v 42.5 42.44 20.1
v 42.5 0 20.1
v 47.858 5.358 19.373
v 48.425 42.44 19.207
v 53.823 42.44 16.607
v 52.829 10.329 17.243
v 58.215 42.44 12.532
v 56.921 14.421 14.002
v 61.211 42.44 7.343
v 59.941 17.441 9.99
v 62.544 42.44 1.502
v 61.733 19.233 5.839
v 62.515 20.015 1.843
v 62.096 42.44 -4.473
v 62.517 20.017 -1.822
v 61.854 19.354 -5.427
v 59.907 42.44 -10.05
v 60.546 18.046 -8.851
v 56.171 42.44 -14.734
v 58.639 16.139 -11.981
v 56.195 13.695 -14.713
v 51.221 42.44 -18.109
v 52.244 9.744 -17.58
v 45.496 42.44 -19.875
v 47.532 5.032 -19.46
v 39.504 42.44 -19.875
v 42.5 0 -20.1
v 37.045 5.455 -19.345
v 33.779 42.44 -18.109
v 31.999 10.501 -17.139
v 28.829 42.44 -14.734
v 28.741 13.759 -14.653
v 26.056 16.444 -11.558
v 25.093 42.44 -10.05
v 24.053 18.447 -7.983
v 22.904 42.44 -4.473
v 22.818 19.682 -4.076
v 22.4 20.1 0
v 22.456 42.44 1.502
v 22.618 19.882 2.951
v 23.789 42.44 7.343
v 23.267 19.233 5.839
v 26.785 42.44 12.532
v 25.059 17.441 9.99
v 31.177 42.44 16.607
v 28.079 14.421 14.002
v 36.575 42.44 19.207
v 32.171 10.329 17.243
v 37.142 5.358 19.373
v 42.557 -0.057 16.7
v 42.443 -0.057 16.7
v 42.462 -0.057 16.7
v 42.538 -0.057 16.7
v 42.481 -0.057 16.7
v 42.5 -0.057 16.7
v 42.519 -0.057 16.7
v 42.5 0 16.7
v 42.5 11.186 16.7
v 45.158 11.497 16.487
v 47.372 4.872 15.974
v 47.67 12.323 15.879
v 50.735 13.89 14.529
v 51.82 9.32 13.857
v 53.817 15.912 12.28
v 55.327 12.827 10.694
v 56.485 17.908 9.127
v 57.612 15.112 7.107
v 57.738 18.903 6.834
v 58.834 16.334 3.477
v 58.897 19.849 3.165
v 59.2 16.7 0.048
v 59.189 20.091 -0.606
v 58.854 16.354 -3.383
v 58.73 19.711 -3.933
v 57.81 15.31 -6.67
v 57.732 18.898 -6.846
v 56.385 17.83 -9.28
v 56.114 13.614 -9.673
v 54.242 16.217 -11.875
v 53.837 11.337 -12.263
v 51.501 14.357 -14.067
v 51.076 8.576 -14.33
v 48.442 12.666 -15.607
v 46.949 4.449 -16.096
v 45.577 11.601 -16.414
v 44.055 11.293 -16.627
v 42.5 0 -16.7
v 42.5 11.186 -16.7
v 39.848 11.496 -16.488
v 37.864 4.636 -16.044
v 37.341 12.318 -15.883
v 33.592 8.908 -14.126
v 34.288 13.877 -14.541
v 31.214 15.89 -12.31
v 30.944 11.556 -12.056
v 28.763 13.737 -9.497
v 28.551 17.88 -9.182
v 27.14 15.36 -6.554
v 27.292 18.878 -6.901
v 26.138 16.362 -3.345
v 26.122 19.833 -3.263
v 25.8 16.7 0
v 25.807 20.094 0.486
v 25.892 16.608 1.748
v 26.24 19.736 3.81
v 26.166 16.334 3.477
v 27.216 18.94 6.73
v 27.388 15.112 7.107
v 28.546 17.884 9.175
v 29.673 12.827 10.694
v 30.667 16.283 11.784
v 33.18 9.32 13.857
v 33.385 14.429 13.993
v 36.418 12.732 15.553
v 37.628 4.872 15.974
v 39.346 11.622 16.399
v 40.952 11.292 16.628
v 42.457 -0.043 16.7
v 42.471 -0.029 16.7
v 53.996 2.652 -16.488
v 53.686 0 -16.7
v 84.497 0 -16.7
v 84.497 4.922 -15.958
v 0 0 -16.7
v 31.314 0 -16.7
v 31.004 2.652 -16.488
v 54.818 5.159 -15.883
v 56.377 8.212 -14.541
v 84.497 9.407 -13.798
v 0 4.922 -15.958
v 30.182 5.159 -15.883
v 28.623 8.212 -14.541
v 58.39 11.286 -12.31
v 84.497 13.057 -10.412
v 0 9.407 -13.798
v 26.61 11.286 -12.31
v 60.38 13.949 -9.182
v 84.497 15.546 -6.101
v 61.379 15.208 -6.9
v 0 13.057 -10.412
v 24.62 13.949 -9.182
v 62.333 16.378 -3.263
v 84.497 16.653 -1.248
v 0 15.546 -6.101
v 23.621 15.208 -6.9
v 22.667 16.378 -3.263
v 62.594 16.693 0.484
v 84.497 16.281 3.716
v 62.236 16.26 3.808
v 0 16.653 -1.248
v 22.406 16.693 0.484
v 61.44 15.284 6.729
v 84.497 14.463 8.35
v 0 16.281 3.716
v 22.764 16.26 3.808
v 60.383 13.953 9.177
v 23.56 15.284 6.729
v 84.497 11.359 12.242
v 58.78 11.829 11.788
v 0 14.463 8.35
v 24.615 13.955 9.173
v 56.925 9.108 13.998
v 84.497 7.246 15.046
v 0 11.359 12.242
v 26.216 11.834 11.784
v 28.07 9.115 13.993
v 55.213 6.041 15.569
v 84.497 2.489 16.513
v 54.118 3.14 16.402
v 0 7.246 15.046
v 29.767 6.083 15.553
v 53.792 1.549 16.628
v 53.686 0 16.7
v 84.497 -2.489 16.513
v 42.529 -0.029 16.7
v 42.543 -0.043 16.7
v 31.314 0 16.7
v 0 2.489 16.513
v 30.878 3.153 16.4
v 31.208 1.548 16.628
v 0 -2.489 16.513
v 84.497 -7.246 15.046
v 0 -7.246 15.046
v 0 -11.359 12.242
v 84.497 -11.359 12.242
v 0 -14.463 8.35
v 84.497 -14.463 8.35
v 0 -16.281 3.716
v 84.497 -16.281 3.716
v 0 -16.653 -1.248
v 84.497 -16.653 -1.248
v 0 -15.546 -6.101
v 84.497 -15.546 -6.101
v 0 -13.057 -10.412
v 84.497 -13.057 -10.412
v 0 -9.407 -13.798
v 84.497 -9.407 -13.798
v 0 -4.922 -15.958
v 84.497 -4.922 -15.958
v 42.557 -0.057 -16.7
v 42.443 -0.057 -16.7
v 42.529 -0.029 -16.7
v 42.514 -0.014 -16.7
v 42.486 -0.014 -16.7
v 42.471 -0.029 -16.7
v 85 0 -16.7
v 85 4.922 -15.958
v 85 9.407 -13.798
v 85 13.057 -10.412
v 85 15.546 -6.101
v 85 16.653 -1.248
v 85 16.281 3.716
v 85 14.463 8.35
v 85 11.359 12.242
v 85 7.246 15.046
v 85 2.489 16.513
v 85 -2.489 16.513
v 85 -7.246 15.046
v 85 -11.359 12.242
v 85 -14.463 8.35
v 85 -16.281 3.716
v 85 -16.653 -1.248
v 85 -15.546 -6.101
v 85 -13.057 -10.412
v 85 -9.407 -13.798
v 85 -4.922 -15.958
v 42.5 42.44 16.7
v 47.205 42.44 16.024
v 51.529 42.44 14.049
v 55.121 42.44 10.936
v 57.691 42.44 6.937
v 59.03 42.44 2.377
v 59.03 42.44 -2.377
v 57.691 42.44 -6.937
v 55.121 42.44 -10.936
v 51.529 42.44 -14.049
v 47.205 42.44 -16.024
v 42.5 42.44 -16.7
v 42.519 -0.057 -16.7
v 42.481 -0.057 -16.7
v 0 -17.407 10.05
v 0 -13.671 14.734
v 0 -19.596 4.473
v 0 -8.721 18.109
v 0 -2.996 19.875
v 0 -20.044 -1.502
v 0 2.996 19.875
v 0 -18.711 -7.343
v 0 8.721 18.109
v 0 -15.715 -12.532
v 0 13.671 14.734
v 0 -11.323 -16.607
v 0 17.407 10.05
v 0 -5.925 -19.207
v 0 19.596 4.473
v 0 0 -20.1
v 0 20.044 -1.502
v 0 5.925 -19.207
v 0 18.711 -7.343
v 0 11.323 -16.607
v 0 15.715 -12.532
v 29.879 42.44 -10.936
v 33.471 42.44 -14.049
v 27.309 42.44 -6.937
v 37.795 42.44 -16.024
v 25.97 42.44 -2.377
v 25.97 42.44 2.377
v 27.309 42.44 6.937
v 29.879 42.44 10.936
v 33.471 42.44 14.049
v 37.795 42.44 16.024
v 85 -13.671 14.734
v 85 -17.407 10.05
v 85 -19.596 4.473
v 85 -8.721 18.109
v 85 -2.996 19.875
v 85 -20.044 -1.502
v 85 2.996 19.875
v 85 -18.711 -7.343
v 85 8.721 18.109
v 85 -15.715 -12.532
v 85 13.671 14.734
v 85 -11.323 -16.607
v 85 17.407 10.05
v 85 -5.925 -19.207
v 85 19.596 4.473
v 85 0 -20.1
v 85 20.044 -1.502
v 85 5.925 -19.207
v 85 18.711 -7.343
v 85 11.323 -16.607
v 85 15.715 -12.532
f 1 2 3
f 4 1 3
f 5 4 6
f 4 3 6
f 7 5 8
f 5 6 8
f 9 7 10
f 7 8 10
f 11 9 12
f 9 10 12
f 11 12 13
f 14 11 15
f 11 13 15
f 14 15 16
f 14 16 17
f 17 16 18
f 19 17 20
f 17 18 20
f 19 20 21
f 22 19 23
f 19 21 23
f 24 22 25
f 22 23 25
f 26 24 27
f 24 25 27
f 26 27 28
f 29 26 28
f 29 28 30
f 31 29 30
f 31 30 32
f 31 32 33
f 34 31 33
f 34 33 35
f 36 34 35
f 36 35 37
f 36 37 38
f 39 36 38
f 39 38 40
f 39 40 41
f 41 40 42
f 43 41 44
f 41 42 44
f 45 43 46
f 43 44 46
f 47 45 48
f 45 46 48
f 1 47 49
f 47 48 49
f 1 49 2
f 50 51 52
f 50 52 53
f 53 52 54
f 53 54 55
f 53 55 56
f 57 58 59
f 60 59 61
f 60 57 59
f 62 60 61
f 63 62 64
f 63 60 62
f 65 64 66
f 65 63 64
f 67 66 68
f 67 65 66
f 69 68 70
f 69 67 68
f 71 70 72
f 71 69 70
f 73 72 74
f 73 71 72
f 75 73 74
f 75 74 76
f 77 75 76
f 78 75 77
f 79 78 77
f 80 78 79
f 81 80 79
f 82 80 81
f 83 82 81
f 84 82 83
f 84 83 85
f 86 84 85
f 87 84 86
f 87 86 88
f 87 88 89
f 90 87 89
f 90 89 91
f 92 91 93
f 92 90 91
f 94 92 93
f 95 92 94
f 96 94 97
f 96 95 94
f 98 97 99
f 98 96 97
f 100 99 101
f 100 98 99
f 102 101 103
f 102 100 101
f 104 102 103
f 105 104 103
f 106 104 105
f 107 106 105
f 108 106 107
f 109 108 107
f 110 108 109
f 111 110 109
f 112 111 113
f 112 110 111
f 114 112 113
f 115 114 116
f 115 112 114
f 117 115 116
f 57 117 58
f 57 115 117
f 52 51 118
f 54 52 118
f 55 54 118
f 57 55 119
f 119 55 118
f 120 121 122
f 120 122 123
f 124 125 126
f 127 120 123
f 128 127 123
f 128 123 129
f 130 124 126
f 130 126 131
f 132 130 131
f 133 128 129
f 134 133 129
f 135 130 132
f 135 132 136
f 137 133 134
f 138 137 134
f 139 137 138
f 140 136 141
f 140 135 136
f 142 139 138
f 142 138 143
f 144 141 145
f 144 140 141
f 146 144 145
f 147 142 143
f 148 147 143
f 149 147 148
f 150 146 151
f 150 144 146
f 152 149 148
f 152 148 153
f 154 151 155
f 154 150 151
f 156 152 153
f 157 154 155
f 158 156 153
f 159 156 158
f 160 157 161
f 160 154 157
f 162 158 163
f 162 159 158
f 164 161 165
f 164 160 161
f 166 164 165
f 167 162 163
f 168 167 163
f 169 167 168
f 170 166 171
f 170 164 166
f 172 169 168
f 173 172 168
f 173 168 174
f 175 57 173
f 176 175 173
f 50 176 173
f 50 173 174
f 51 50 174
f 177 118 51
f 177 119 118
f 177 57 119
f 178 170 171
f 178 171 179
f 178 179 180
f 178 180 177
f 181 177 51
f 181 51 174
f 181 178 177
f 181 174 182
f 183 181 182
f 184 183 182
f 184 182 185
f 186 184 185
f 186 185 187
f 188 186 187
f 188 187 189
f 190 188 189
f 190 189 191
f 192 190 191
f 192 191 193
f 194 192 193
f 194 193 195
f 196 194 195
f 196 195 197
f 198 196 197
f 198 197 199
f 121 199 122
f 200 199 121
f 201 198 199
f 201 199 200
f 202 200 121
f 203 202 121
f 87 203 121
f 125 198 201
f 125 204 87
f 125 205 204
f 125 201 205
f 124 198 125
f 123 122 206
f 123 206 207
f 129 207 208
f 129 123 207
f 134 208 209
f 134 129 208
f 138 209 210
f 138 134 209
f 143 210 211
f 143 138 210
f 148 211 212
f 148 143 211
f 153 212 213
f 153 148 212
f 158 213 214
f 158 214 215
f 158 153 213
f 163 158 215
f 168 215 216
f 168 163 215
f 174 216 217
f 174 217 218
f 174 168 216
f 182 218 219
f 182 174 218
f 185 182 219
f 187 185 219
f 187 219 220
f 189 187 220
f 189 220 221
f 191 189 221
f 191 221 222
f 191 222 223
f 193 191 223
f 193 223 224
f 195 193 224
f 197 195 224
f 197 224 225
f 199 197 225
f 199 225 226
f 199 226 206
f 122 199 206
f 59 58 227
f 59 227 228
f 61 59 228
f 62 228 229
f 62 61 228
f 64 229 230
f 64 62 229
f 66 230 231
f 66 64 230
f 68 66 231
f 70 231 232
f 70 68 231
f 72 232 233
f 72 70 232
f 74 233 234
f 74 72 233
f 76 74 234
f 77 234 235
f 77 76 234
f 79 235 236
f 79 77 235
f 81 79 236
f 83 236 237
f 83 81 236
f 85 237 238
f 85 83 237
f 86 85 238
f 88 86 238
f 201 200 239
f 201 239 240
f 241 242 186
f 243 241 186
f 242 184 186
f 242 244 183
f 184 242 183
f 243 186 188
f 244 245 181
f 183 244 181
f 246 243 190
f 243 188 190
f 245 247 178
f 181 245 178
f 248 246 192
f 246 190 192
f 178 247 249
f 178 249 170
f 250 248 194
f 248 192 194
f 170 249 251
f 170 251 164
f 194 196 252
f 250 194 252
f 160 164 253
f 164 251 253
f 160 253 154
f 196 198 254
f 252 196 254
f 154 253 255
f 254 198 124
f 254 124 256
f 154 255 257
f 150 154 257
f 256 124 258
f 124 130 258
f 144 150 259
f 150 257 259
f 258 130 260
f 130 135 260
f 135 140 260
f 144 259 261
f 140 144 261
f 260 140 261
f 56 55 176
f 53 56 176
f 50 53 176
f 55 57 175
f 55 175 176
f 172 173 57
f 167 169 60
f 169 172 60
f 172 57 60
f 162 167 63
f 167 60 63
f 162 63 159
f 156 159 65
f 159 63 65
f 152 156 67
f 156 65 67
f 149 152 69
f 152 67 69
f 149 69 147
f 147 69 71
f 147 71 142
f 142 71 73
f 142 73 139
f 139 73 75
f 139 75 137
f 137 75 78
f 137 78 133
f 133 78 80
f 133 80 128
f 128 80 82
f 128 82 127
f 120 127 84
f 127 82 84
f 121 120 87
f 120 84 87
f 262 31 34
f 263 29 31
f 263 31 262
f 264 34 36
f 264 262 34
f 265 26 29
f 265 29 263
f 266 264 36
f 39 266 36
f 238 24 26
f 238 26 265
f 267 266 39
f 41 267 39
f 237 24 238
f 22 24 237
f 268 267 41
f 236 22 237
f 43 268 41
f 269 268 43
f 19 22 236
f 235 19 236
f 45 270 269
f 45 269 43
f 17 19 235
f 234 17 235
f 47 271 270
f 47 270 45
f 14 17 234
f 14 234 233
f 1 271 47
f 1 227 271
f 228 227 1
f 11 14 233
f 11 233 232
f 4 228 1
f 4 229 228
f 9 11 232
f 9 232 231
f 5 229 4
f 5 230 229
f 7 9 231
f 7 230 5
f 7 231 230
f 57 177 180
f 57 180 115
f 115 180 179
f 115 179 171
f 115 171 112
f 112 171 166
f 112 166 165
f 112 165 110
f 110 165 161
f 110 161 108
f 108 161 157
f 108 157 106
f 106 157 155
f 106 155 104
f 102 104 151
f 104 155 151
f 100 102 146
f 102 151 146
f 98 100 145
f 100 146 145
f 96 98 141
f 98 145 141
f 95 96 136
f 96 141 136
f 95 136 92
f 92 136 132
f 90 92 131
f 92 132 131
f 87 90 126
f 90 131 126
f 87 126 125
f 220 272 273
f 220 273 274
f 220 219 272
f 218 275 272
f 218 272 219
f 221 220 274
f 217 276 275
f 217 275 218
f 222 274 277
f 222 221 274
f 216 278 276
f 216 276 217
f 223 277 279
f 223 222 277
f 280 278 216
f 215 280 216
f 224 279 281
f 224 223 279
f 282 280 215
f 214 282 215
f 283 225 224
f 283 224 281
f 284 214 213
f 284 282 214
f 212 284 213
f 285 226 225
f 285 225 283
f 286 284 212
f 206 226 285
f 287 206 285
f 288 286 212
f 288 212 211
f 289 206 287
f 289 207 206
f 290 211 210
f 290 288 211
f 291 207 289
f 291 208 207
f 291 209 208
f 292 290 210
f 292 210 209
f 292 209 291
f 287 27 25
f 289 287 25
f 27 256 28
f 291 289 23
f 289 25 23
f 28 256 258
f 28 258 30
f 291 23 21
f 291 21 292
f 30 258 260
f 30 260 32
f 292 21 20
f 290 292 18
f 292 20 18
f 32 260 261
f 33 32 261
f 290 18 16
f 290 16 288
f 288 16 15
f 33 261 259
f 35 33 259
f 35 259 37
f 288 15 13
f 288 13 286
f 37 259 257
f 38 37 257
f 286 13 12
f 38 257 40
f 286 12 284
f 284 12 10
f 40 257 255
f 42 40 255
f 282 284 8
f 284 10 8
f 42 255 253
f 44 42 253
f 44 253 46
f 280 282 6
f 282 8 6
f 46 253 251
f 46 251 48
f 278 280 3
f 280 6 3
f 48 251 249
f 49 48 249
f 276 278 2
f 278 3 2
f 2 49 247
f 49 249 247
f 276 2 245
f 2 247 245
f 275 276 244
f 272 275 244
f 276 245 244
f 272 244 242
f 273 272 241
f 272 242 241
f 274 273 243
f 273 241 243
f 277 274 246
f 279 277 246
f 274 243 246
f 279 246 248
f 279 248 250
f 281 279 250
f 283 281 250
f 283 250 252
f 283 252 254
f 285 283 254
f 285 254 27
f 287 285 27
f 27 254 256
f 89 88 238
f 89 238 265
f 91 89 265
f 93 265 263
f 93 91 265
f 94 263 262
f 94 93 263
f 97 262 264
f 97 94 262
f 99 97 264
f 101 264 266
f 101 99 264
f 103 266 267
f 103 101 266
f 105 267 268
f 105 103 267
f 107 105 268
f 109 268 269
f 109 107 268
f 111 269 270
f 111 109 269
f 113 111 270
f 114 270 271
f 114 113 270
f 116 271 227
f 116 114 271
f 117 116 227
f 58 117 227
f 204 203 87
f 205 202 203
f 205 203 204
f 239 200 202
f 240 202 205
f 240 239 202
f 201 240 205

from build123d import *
from build123d.topology import SkipClean

# Parameters (mm, degrees)
CROQUIS1_R              = 20.1
CROQUIS1_R_2            = 16.7
SALIENTE_EXTRUIR1_DEPTH = 85
CROQUIS2_R              = 20.1
CROQUIS2_R_2            = 16.7
SALIENTE_EXTRUIR2_DEPTH = 42.44
CROQUIS3_R              = 16.7
CORTAR_EXTRUIR1_DEPTH   = 84.497438367
CORTAR_EXTRUIR2_START   = -42.497438367
CROQUIS5_R              = 16.7
CORTAR_EXTRUIR2_DEPTH   = 42.497438367


with BuildPart() as part:
    # Croquis1 → Saliente-Extruir1 (new body)
    with BuildSketch(Plane(origin=(0, 0, 0), x_dir=(0, 0, -1), z_dir=(1, 0, 0))):
        Circle(CROQUIS1_R)
        Circle(CROQUIS1_R_2, mode=Mode.SUBTRACT)
    extrude(amount=SALIENTE_EXTRUIR1_DEPTH)

    # Croquis2 → Saliente-Extruir2 (add)
    with BuildSketch(Plane(origin=(0, 0, 0), x_dir=(1, 0, 0), z_dir=(0, 1, 0))):
        with Locations(Location((42.5, 0, 0), (0, 0, 270))):
            Circle(CROQUIS2_R)
        with Locations(Location((42.5, 0, 0), (0, 0, 90))):
            Circle(CROQUIS2_R_2, mode=Mode.SUBTRACT)
    extrude(amount=SALIENTE_EXTRUIR2_DEPTH)

    # Croquis3 → Cortar-Extruir1 (cut)
    with SkipClean():  # the faces are left unmerged after this step: merging them gives an invalid solid
        with BuildSketch(Plane.ZY):
            with Locations(Location((0, 0, 0), (0, 0, 180))):
                Circle(CROQUIS3_R)
        extrude(amount=-CORTAR_EXTRUIR1_DEPTH, mode=Mode.SUBTRACT)

    # Croquis5 → Cortar-Extruir2 (cut)
    with SkipClean():  # the faces are left unmerged after this step: merging them gives an invalid solid
        with BuildSketch(Plane(origin=(0, 42.44, 0), x_dir=(1, 0, 0), z_dir=(0, 1, 0)).offset(CORTAR_EXTRUIR2_START)):
            with Locations(Location((42.5, 0, 0), (0, 0, 270))):
                Circle(CROQUIS5_R)
        extrude(amount=CORTAR_EXTRUIR2_DEPTH, mode=Mode.SUBTRACT)


solid = part.part
